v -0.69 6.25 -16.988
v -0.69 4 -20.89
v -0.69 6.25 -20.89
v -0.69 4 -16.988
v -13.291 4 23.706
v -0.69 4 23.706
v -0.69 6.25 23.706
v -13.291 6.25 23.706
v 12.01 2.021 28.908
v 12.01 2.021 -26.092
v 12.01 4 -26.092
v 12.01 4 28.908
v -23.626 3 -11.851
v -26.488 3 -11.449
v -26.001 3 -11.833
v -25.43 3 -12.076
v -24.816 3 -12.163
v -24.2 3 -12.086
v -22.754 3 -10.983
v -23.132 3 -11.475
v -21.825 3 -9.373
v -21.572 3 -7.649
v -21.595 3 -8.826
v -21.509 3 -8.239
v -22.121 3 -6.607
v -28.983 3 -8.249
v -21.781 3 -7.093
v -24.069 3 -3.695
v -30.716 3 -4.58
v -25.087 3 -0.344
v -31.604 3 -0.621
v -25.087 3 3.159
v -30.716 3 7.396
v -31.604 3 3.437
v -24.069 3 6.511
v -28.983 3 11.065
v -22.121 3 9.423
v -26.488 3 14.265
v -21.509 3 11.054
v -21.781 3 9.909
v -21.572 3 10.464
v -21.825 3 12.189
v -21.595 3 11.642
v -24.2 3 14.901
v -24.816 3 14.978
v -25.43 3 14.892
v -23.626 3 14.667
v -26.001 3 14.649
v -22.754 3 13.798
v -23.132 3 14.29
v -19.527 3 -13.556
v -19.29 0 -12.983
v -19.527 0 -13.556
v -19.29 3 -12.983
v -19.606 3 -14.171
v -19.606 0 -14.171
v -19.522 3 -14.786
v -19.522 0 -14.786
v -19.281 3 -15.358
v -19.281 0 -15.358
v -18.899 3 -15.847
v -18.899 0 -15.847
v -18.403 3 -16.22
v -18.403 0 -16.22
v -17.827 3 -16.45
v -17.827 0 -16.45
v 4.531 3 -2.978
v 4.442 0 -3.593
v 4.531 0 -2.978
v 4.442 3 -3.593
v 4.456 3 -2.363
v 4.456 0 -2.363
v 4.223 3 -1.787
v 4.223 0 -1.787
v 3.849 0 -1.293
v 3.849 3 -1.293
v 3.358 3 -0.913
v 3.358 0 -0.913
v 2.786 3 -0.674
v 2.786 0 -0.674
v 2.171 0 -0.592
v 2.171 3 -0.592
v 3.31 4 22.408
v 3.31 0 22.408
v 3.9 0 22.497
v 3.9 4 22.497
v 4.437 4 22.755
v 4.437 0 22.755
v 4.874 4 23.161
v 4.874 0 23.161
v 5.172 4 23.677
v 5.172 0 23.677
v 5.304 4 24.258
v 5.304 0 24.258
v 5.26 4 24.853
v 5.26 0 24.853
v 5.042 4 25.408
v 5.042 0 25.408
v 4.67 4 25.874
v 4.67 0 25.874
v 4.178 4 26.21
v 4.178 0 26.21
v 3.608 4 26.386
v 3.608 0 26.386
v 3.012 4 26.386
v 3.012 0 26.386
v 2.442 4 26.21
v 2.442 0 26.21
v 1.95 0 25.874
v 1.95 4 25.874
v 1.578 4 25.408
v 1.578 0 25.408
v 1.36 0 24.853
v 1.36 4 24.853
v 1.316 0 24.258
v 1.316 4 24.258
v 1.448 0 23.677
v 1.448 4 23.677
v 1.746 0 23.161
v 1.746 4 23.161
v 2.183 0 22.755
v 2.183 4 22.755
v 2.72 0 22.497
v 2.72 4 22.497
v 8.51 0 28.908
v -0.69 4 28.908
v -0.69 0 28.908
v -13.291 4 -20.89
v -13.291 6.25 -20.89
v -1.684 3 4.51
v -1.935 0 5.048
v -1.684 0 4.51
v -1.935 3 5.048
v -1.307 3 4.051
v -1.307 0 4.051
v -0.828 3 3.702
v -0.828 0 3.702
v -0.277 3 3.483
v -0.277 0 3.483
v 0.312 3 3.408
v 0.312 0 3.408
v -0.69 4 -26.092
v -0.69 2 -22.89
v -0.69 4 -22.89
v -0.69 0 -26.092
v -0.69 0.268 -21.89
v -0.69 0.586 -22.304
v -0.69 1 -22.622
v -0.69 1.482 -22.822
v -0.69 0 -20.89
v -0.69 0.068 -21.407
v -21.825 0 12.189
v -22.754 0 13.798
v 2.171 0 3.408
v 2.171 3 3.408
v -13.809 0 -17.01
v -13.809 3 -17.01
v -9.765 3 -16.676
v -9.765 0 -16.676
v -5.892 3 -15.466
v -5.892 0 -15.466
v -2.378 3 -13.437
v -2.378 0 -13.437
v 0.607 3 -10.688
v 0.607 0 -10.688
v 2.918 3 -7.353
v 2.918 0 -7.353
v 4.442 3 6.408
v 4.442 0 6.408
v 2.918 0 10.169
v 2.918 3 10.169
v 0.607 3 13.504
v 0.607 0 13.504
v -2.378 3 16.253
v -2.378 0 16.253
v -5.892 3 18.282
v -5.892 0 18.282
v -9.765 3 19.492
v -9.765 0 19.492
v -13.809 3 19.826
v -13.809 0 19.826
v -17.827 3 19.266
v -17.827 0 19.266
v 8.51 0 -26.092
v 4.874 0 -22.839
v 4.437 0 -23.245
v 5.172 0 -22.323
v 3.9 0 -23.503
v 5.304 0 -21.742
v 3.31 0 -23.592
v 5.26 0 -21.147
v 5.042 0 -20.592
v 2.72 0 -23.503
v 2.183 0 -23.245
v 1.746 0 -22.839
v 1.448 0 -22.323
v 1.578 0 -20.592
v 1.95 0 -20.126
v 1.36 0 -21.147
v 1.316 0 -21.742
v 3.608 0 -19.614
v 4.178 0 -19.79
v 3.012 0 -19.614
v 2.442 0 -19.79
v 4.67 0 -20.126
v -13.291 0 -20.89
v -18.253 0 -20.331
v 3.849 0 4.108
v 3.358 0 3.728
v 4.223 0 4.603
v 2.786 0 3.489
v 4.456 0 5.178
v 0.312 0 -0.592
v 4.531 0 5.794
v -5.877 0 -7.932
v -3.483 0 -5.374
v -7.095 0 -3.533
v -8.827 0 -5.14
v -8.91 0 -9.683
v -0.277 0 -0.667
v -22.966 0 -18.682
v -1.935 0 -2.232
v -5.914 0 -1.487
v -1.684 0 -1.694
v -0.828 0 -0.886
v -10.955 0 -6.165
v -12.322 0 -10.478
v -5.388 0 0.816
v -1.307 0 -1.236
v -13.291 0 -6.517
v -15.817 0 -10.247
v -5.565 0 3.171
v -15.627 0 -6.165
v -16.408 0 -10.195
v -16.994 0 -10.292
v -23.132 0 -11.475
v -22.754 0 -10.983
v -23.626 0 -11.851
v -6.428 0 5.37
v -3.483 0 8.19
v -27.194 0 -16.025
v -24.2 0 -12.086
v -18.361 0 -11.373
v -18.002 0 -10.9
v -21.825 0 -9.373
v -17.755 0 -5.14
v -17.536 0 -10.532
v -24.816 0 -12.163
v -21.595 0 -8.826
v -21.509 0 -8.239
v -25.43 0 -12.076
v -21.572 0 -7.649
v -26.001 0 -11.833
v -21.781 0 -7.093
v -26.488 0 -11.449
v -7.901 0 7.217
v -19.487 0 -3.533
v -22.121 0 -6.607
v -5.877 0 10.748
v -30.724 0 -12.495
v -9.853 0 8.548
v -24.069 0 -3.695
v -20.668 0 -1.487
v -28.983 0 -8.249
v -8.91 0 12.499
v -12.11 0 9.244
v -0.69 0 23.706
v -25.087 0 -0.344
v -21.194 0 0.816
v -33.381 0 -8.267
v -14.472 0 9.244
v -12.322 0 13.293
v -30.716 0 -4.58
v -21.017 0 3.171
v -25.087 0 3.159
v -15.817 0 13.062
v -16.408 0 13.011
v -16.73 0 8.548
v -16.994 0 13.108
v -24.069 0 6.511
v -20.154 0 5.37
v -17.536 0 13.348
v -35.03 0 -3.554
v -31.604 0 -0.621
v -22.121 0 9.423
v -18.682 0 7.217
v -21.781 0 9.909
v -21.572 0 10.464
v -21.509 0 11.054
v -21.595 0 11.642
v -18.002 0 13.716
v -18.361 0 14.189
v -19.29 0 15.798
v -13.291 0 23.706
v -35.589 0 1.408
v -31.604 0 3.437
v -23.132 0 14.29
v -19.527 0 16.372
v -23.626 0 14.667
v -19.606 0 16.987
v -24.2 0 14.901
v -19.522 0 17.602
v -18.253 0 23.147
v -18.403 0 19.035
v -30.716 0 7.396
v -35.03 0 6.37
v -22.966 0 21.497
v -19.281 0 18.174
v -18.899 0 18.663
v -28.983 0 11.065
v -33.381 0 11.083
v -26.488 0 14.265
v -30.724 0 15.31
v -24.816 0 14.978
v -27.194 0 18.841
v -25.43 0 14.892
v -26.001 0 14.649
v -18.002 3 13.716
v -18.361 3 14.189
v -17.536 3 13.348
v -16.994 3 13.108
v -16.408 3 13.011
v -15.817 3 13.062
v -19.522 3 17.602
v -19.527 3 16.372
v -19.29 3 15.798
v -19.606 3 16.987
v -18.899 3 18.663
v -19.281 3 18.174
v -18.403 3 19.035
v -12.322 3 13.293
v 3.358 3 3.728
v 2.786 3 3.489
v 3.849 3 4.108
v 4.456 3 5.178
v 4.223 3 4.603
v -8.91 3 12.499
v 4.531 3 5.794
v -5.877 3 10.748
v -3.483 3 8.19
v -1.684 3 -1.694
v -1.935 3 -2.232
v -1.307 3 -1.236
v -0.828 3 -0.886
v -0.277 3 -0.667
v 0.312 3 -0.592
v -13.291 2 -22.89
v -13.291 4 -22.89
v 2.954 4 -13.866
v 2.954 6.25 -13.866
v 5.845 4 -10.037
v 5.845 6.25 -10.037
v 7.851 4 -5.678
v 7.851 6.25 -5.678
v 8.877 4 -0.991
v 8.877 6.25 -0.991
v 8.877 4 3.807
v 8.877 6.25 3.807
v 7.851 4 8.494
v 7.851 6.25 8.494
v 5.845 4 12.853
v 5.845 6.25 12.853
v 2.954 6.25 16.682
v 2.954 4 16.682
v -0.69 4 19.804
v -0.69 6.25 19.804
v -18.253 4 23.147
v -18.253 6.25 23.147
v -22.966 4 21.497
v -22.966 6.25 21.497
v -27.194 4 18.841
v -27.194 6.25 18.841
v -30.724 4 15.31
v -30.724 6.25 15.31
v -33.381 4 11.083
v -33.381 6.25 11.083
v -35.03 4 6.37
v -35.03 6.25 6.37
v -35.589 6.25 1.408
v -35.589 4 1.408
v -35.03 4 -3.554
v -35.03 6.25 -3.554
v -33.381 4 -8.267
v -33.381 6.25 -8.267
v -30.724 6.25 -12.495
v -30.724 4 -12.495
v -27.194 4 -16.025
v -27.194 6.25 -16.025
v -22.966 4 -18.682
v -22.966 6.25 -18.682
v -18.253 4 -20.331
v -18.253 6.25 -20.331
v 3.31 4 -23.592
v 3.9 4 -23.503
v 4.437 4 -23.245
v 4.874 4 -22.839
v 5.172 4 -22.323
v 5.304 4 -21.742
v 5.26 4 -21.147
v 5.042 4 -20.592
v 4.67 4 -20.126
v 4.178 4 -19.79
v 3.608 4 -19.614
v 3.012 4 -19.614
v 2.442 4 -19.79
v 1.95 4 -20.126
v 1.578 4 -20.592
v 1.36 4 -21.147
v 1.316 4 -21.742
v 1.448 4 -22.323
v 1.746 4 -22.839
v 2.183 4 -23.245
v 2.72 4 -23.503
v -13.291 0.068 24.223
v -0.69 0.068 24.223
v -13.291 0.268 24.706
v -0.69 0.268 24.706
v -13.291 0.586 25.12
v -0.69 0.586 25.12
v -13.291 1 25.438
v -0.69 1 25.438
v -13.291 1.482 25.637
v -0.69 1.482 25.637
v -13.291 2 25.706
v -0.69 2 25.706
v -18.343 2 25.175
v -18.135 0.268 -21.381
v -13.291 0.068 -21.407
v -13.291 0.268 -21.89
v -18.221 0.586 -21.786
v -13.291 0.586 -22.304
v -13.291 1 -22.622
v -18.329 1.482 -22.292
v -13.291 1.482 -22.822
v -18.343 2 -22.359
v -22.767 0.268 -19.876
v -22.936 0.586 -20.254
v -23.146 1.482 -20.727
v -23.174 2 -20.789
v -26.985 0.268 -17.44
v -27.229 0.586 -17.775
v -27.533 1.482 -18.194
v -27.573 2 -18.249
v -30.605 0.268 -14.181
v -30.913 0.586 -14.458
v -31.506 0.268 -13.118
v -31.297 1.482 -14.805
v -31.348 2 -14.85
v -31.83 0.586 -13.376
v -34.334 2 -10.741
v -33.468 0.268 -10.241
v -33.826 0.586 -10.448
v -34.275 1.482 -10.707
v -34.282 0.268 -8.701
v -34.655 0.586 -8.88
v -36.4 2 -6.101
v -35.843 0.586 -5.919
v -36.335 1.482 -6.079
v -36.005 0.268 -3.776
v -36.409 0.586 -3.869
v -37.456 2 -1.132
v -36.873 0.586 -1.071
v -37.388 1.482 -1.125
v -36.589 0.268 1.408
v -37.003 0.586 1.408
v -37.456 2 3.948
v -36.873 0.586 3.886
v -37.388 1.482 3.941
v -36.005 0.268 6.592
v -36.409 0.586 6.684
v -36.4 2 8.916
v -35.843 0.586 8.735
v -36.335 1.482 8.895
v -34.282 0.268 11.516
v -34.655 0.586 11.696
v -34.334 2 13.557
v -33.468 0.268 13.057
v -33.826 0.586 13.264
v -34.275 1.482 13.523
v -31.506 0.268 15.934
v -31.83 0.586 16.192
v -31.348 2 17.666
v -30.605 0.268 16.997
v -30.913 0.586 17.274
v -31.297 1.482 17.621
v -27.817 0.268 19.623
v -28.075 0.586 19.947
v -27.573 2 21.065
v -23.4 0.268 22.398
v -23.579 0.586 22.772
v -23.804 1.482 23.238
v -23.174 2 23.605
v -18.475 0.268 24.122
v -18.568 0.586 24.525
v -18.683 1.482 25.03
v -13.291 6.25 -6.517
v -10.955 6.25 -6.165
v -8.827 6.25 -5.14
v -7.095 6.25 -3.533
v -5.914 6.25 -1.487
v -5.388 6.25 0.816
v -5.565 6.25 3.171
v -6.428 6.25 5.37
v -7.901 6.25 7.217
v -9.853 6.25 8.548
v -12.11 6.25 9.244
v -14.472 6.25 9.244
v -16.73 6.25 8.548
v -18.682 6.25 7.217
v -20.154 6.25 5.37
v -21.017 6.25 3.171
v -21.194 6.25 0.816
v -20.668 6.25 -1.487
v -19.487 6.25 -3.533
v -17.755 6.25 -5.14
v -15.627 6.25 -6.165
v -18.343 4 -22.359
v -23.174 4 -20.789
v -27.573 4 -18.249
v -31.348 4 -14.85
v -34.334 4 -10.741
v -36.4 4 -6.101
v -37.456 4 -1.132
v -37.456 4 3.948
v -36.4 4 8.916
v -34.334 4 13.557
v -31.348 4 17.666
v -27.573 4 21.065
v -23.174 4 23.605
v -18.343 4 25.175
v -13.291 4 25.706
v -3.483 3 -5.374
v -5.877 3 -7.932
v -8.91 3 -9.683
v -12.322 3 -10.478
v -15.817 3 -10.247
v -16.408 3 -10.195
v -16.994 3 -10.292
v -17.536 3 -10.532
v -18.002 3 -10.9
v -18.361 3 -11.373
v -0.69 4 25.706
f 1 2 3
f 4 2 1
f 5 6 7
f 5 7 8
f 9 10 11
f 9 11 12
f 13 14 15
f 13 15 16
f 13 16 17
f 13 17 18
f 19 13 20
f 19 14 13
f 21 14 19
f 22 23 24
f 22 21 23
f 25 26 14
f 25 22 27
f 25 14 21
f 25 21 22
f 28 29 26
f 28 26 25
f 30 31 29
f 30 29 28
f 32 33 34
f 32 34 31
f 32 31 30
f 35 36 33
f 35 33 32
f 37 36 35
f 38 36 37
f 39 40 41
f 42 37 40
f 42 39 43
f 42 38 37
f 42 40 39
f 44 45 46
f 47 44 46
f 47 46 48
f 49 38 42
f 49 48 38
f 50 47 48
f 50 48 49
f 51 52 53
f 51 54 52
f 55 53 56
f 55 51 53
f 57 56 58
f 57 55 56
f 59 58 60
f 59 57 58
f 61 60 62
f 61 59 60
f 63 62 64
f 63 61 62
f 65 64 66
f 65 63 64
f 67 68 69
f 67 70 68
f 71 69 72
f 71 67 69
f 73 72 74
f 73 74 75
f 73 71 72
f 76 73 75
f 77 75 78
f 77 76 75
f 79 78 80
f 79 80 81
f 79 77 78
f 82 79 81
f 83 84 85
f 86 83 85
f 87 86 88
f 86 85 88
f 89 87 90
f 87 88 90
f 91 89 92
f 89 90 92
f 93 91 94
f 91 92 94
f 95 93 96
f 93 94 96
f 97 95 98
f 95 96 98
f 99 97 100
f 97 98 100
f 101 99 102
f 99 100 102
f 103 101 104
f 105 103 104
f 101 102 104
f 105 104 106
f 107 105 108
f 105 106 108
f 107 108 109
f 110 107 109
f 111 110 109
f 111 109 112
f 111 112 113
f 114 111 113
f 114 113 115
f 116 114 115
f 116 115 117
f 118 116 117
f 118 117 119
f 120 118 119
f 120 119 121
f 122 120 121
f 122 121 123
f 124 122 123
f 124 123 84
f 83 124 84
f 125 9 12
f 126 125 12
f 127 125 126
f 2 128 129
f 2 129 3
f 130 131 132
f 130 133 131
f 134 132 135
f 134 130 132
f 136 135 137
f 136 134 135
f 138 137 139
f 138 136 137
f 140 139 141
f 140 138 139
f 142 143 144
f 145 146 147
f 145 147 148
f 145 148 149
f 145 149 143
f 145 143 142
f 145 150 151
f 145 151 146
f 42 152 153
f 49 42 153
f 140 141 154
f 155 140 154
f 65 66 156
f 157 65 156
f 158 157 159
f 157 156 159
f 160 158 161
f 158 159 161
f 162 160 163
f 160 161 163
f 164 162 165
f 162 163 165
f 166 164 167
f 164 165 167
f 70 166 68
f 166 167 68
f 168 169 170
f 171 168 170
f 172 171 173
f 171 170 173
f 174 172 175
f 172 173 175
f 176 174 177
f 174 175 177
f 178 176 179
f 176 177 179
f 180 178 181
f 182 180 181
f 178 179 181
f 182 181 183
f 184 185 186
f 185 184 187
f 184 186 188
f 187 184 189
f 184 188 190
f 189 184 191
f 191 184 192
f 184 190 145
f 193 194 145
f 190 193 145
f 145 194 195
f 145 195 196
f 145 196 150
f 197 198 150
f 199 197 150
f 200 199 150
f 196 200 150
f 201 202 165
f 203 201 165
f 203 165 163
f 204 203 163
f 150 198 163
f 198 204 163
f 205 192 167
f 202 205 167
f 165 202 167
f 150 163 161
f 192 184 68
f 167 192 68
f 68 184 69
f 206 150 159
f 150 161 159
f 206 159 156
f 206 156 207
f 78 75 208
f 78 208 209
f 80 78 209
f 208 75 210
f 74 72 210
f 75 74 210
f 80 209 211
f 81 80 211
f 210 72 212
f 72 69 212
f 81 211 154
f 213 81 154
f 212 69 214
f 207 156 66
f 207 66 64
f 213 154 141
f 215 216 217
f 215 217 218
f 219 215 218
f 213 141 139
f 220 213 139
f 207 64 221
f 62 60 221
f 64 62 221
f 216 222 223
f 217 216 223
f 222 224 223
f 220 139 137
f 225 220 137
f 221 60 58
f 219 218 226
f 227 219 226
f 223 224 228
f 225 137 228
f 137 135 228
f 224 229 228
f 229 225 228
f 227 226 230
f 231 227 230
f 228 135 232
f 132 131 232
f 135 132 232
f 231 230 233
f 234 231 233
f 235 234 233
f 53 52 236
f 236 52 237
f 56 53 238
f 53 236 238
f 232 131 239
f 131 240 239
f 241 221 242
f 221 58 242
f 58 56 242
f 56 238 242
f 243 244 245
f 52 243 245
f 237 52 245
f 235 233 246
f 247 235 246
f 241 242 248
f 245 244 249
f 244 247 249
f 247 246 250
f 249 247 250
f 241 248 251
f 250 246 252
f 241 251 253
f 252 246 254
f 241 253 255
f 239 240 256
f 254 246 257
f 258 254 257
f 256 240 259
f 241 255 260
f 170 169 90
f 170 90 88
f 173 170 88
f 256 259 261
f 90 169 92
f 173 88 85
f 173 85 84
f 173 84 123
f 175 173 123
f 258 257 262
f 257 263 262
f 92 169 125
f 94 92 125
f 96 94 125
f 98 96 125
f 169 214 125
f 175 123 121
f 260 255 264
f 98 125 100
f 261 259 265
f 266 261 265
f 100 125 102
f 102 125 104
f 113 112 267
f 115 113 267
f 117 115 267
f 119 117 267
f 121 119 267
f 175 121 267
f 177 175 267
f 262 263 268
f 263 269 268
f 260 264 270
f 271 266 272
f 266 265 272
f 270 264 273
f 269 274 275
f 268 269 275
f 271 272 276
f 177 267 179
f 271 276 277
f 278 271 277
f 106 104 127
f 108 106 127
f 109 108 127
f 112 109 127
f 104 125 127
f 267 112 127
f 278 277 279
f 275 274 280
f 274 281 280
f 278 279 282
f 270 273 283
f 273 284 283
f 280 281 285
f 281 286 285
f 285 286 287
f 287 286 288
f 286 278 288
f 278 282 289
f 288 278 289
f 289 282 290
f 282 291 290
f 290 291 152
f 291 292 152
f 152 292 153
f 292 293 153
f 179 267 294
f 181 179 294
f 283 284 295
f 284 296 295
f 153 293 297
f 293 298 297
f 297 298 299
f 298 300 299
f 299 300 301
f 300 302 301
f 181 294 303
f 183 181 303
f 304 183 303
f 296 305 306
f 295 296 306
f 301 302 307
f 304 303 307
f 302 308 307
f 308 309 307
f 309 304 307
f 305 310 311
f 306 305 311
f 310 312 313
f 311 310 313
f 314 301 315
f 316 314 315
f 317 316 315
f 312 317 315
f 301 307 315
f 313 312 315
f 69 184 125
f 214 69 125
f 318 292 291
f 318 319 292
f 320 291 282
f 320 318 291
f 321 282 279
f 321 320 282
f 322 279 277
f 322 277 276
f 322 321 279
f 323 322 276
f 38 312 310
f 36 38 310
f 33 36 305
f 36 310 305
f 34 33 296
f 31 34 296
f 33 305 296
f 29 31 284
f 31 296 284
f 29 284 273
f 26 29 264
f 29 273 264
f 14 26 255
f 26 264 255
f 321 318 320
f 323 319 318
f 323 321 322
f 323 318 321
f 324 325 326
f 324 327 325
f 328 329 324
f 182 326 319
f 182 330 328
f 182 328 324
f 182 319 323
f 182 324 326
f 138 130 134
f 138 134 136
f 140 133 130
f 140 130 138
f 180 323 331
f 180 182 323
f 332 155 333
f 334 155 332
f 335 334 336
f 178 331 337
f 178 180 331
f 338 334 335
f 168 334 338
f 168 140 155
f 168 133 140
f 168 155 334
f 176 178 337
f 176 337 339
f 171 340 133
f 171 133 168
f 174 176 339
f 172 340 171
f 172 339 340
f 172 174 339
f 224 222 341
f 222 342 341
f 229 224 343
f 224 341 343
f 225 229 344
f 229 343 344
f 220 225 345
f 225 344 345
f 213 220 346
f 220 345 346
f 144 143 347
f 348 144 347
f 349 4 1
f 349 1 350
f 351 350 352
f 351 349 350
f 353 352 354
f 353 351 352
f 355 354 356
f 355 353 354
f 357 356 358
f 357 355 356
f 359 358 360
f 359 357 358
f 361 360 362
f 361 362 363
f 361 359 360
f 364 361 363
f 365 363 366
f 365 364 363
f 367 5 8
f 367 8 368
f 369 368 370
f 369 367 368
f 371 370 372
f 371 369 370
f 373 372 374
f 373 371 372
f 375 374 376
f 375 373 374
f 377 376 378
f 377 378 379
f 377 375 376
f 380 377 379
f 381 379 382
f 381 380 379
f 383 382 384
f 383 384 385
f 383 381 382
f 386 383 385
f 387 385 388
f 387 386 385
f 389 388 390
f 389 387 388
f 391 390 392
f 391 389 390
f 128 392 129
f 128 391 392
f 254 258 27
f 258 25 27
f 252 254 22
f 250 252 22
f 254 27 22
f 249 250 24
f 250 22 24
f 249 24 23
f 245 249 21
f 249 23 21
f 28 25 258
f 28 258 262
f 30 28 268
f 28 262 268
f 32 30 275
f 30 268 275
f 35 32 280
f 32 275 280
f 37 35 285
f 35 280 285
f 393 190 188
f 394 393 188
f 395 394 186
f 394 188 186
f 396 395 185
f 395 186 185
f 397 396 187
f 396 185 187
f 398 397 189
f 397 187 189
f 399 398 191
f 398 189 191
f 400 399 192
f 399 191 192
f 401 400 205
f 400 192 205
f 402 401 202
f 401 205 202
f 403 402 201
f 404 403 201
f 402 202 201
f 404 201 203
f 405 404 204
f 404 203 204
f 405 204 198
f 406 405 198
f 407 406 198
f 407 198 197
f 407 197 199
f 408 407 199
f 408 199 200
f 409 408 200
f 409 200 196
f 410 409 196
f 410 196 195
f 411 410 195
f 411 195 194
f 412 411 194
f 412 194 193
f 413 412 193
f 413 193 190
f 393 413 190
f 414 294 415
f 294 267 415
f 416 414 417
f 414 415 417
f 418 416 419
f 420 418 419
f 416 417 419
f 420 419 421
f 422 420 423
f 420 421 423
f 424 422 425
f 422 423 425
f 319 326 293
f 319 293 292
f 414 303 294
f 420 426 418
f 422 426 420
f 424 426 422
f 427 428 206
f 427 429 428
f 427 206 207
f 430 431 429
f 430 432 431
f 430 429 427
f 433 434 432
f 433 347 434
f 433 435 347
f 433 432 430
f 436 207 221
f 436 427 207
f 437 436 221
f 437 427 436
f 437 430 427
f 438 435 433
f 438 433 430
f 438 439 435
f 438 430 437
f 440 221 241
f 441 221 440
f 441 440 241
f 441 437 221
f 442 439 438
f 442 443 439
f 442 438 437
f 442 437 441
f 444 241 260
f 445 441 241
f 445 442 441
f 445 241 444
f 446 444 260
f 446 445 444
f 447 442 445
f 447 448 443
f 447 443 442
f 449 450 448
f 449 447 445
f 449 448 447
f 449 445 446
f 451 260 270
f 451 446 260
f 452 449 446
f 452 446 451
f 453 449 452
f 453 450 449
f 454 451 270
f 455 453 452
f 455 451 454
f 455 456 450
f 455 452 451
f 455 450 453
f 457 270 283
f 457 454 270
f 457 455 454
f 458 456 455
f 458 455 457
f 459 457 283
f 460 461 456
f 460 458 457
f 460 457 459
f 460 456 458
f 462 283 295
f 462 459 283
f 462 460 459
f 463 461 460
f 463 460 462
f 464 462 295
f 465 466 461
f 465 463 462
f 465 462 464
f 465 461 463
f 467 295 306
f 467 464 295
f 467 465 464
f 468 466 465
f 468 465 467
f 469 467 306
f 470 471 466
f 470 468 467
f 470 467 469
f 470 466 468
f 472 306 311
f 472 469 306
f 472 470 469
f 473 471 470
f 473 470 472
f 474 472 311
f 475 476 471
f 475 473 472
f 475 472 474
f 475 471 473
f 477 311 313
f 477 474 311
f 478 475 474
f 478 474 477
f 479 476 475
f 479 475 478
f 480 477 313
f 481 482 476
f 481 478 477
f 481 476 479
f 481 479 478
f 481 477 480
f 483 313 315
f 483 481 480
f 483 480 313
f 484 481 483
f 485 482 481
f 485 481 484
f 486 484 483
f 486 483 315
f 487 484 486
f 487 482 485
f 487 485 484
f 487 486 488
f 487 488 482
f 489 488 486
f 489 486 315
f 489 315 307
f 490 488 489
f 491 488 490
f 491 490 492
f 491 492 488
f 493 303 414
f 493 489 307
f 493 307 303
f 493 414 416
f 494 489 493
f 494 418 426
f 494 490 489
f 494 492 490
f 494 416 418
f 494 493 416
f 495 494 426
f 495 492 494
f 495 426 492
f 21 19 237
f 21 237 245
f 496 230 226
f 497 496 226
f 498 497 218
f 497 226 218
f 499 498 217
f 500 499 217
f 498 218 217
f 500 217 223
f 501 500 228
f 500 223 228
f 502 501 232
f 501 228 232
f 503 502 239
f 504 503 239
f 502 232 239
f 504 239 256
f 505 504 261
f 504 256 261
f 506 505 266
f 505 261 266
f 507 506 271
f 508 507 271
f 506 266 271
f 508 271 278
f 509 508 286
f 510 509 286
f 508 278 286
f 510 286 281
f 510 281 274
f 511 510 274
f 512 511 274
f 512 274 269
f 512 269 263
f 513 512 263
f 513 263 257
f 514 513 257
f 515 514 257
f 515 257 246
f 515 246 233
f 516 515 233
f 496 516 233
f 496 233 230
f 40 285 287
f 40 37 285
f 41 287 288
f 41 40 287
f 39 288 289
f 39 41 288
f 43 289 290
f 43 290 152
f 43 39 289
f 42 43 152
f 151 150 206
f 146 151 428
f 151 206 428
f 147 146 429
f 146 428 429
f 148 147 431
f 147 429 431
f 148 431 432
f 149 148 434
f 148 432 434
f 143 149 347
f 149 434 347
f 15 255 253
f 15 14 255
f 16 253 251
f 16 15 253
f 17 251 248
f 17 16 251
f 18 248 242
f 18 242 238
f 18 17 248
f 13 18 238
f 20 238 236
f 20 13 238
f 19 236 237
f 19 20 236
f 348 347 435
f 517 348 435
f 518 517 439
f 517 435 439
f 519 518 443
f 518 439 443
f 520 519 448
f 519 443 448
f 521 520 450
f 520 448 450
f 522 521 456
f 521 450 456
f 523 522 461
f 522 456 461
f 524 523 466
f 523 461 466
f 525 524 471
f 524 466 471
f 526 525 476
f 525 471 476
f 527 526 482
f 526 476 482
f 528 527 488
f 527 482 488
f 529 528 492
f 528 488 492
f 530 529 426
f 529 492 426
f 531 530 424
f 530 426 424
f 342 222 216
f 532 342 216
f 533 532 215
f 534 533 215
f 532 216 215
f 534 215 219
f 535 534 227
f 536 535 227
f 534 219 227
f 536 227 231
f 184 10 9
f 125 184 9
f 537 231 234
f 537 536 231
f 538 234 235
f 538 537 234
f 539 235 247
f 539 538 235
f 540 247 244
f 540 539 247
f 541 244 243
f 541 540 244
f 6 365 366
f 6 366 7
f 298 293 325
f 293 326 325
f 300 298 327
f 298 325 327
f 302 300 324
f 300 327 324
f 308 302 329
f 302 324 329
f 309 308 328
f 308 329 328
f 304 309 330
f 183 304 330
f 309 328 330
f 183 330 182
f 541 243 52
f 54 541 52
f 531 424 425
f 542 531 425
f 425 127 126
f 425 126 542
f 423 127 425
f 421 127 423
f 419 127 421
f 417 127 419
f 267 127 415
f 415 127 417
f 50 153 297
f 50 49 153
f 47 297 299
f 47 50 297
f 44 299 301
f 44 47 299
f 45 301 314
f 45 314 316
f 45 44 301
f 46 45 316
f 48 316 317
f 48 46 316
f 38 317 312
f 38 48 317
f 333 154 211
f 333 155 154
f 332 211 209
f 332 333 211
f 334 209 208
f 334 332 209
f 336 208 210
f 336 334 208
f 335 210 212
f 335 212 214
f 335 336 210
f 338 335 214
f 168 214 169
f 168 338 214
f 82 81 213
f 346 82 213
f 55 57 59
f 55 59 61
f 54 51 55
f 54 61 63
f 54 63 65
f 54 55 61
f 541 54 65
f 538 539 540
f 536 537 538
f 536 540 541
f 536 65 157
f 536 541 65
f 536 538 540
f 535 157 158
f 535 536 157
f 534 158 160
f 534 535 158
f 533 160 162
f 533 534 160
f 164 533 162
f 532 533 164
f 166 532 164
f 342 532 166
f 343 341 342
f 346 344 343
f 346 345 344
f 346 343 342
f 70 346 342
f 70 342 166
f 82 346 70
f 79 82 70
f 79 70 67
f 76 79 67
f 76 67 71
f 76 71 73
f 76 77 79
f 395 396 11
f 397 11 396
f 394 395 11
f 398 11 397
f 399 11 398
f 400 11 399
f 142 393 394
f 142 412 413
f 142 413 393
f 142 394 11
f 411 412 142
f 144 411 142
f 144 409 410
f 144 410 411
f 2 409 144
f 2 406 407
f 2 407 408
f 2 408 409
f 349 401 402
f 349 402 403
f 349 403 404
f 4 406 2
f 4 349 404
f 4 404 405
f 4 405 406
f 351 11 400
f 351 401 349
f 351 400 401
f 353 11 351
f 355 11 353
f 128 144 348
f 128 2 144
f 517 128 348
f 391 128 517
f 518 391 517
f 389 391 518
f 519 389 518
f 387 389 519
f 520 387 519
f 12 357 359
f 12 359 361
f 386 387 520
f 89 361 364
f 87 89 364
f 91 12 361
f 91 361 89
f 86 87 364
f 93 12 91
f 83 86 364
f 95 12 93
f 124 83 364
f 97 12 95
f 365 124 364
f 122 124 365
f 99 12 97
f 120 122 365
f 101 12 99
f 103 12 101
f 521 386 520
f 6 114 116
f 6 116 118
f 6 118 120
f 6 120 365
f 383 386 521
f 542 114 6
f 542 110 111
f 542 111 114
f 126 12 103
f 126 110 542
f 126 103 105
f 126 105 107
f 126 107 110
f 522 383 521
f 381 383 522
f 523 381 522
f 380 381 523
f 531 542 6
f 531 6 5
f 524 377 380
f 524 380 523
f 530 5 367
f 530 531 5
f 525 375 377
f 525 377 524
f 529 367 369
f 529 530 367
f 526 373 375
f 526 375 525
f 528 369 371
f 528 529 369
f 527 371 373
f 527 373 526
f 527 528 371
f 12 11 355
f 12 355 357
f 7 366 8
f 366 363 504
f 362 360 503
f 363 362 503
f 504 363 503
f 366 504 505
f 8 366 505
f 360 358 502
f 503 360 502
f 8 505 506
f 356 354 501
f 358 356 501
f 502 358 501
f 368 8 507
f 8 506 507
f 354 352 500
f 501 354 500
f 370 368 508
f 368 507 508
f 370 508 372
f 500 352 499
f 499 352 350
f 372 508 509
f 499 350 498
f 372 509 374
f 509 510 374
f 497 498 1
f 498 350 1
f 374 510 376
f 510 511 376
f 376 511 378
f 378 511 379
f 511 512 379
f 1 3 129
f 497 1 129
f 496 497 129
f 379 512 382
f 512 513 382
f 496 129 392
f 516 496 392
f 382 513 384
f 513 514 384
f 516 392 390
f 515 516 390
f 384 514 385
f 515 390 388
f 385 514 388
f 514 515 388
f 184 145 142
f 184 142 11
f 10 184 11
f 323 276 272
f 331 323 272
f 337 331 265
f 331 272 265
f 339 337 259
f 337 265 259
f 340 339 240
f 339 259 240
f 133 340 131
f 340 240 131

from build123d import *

# Parameters (mm, degrees)
BOSS_EXTRUDE1_DEPTH = 4
BOSS_EXTRUDE2_DEPTH = 2.25
SKETCH3_R           = 7.925
CUT_EXTRUDE1_DEPTH  = 9.25
SKETCH4_R           = 2
CUT_EXTRUDE2_DEPTH  = 9.25
CUT_EXTRUDE3_DEPTH  = 3
FILLET1_R           = 2.36
CHAMFER1_SIZE       = 3.5
CHAMFER1_SIZE2      = 2.020725942
BOSS_EXTRUDE3_DEPTH = 4
FILLET2_R           = 2


with BuildPart() as part:
    # Sketch1 → Boss-Extrude1 (new body)
    with BuildSketch(Plane(origin=(0, 0, 0), x_dir=(1, 0, 0), z_dir=(0, 1, 0))):
        with BuildLine():
            Line((-13.29118379, 20.889836125), (-0.68999579, 20.889836125))
            Line((-0.68999579, 20.889836125), (-0.68999579, 24.09210312))
            Line((-0.68999579, 24.09210312), (-0.68999579, 26.09210312))
            Line((-0.68999579, 26.09210312), (12.01000421, 26.09210312))
            Line((12.01000421, 26.09210312), (12.01000421, 24.09210312))
            Line((12.01000421, 24.09210312), (12.01000421, -26.90789688))
            Line((12.01000421, -26.90789688), (12.01000421, -28.90789688))
            Line((12.01000421, -28.90789688), (-0.68999579, -28.90789688))
            Line((-0.68999579, -28.90789688), (-0.68999579, -26.90789688))
            Line((-0.68999579, -26.90789688), (-0.68999579, -23.705629885))
            Line((-0.68999579, -23.705629885), (-13.29118379, -23.705629885))
            ThreePointArc((-13.29118379, -23.705629885), (-35.588916795, -1.40789688), (-13.29118379, 20.889836125))
        make_face()
    extrude(amount=BOSS_EXTRUDE1_DEPTH)

    # Sketch2 → Boss-Extrude2 (add)
    with BuildSketch(Plane(origin=(0, 4, 0), x_dir=(1, 0, 0), z_dir=(0, 1, 0))):
        with BuildLine():
            Line((-0.68999579, 20.889836125), (-0.68999579, 16.987726462))
            ThreePointArc((-0.68999579, 16.987726462), (9.006549215, -1.40789688), (-0.68999579, -19.803520222))
            Line((-0.68999579, -19.803520222), (-0.68999579, -23.705629885))
            Line((-0.68999579, -23.705629885), (-13.29118379, -23.705629885))
            ThreePointArc((-13.29118379, -23.705629885), (-35.588916795, -1.40789688), (-13.29118379, 20.889836125))
            Line((-13.29118379, 20.889836125), (-0.68999579, 20.889836125))
        make_face()
    extrude(amount=BOSS_EXTRUDE2_DEPTH)

    # Sketch3 → Cut-Extrude1 (cut)
    with BuildSketch(Plane.XZ):
        with Locations((-13.29118379, 1.40789688)):
            Circle(SKETCH3_R)
    extrude(amount=-CUT_EXTRUDE1_DEPTH, mode=Mode.SUBTRACT)

    # Sketch4 → Cut-Extrude2 (cut)
    with BuildSketch(Plane.XZ):
        with Locations((3.31000421, -21.59210312)):
            Circle(SKETCH4_R)
        with Locations((3.31000421, 24.40789688)):
            Circle(SKETCH4_R)
    extrude(amount=-CUT_EXTRUDE2_DEPTH, mode=Mode.SUBTRACT)

    # Sketch5 → Cut-Extrude3 (cut)
    with BuildSketch(Plane.XZ):
        with BuildLine():
            ThreePointArc((-20.901279021, -7.773174712), (-25.21618379, 1.40789688), (-20.901279021, 10.588968471))
            Line((-20.901279021, 10.588968471), (-24.18129969, 16.27013092))
            ThreePointArc((-24.18129969, 16.27013092), (-31.71618379, 1.40789688), (-24.18129969, -13.454337161))
            Line((-24.18129969, -13.454337161), (-20.901279021, -7.773174712))
        make_face()
        with BuildLine():
            Line((-20.717198075, 18.27013092), (-17.437177406, 12.588968471))
            ThreePointArc((-17.437177406, 12.588968471), (-7.32868379, 11.73524982), (-1.535094942, 3.40789688))
            Line((-1.535094942, 3.40789688), (5.024946397, 3.40789688))
            ThreePointArc((5.024946397, 3.40789688), (-4.07868379, 17.364414944), (-20.717198075, 18.27013092))
        make_face()
        with BuildLine():
            ThreePointArc((-1.535094942, -0.59210312), (-7.32868379, -8.91945606), (-17.437177406, -9.773174712))
            Line((-17.437177406, -9.773174712), (-20.717198075, -15.454337161))
            ThreePointArc((-20.717198075, -15.454337161), (-4.07868379, -14.548621185), (5.024946397, -0.59210312))
            Line((5.024946397, -0.59210312), (-1.535094942, -0.59210312))
        make_face()
    extrude(amount=-CUT_EXTRUDE3_DEPTH, mode=Mode.SUBTRACT)

    # Fillet1
    fillet1_edges = [part.edges().sort_by_distance(p)[0] for p in [
        (5.024946397, 1.5, 3.40789688),
        (-1.535094942, 1.5, 3.40789688),
        (5.024946397, 1.5, -0.59210312),
        (-24.18129969, 1.5, 16.27013092),
        (-20.717198075, 1.5, 18.27013092),
        (-1.535094942, 1.5, -0.59210312),
        (-20.717198075, 1.5, -15.454337161),
        (-20.901279021, 1.5, 10.588968471),
        (-20.901279021, 1.5, -7.773174712),
        (-24.18129969, 1.5, -13.454337161),
        (-17.437177406, 1.5, -9.773174712),
        (-17.437177406, 1.5, 12.588968471),
    ]]
    fillet(fillet1_edges, radius=FILLET1_R)

    # Chamfer1
    chamfer1_edges = [part.edges().sort_by_distance(p)[0] for p in [
        (12.01000421, 0, 1.40789688),
    ]]
    chamfer1_side = [part.faces().sort_by_distance(p)[0] for p in [
        (-3.714999267, 0, 17.994335016),
    ]]
    chamfer(chamfer1_edges, length=CHAMFER1_SIZE, length2=CHAMFER1_SIZE2, reference=chamfer1_side[0])

    # Sketch6 → Boss-Extrude3 (add)
    with BuildSketch(Plane.XZ):
        with BuildLine():
            Line((-0.68999579, -22.889836125), (-13.29118379, -22.889836125))
            ThreePointArc((-13.29118379, -22.889836125), (-37.588916795, 1.40789688), (-13.29118379, 25.705629885))
            Line((-13.29118379, 25.705629885), (-0.68999579, 25.705629885))
            Line((-0.68999579, 25.705629885), (-0.68999579, 23.705629885))
            Line((-0.68999579, 23.705629885), (-13.29118379, 23.705629885))
            ThreePointArc((-13.29118379, 23.705629885), (-35.588916795, 1.40789688), (-13.29118379, -20.889836125))
            Line((-13.29118379, -20.889836125), (-0.68999579, -20.889836125))
            Line((-0.68999579, -20.889836125), (-0.68999579, -22.889836125))
        make_face()
    extrude(amount=-BOSS_EXTRUDE3_DEPTH)

    # Fillet2
    fillet2_edges = [part.edges().sort_by_distance(p)[0] for p in [
        (-6.99058979, 0, 25.705629885),
        (-6.99058979, 0, -22.889836125),
        (-37.588916795, 0, 1.40789688),
    ]]
    fillet(fillet2_edges, radius=FILLET2_R)


solid = part.part
